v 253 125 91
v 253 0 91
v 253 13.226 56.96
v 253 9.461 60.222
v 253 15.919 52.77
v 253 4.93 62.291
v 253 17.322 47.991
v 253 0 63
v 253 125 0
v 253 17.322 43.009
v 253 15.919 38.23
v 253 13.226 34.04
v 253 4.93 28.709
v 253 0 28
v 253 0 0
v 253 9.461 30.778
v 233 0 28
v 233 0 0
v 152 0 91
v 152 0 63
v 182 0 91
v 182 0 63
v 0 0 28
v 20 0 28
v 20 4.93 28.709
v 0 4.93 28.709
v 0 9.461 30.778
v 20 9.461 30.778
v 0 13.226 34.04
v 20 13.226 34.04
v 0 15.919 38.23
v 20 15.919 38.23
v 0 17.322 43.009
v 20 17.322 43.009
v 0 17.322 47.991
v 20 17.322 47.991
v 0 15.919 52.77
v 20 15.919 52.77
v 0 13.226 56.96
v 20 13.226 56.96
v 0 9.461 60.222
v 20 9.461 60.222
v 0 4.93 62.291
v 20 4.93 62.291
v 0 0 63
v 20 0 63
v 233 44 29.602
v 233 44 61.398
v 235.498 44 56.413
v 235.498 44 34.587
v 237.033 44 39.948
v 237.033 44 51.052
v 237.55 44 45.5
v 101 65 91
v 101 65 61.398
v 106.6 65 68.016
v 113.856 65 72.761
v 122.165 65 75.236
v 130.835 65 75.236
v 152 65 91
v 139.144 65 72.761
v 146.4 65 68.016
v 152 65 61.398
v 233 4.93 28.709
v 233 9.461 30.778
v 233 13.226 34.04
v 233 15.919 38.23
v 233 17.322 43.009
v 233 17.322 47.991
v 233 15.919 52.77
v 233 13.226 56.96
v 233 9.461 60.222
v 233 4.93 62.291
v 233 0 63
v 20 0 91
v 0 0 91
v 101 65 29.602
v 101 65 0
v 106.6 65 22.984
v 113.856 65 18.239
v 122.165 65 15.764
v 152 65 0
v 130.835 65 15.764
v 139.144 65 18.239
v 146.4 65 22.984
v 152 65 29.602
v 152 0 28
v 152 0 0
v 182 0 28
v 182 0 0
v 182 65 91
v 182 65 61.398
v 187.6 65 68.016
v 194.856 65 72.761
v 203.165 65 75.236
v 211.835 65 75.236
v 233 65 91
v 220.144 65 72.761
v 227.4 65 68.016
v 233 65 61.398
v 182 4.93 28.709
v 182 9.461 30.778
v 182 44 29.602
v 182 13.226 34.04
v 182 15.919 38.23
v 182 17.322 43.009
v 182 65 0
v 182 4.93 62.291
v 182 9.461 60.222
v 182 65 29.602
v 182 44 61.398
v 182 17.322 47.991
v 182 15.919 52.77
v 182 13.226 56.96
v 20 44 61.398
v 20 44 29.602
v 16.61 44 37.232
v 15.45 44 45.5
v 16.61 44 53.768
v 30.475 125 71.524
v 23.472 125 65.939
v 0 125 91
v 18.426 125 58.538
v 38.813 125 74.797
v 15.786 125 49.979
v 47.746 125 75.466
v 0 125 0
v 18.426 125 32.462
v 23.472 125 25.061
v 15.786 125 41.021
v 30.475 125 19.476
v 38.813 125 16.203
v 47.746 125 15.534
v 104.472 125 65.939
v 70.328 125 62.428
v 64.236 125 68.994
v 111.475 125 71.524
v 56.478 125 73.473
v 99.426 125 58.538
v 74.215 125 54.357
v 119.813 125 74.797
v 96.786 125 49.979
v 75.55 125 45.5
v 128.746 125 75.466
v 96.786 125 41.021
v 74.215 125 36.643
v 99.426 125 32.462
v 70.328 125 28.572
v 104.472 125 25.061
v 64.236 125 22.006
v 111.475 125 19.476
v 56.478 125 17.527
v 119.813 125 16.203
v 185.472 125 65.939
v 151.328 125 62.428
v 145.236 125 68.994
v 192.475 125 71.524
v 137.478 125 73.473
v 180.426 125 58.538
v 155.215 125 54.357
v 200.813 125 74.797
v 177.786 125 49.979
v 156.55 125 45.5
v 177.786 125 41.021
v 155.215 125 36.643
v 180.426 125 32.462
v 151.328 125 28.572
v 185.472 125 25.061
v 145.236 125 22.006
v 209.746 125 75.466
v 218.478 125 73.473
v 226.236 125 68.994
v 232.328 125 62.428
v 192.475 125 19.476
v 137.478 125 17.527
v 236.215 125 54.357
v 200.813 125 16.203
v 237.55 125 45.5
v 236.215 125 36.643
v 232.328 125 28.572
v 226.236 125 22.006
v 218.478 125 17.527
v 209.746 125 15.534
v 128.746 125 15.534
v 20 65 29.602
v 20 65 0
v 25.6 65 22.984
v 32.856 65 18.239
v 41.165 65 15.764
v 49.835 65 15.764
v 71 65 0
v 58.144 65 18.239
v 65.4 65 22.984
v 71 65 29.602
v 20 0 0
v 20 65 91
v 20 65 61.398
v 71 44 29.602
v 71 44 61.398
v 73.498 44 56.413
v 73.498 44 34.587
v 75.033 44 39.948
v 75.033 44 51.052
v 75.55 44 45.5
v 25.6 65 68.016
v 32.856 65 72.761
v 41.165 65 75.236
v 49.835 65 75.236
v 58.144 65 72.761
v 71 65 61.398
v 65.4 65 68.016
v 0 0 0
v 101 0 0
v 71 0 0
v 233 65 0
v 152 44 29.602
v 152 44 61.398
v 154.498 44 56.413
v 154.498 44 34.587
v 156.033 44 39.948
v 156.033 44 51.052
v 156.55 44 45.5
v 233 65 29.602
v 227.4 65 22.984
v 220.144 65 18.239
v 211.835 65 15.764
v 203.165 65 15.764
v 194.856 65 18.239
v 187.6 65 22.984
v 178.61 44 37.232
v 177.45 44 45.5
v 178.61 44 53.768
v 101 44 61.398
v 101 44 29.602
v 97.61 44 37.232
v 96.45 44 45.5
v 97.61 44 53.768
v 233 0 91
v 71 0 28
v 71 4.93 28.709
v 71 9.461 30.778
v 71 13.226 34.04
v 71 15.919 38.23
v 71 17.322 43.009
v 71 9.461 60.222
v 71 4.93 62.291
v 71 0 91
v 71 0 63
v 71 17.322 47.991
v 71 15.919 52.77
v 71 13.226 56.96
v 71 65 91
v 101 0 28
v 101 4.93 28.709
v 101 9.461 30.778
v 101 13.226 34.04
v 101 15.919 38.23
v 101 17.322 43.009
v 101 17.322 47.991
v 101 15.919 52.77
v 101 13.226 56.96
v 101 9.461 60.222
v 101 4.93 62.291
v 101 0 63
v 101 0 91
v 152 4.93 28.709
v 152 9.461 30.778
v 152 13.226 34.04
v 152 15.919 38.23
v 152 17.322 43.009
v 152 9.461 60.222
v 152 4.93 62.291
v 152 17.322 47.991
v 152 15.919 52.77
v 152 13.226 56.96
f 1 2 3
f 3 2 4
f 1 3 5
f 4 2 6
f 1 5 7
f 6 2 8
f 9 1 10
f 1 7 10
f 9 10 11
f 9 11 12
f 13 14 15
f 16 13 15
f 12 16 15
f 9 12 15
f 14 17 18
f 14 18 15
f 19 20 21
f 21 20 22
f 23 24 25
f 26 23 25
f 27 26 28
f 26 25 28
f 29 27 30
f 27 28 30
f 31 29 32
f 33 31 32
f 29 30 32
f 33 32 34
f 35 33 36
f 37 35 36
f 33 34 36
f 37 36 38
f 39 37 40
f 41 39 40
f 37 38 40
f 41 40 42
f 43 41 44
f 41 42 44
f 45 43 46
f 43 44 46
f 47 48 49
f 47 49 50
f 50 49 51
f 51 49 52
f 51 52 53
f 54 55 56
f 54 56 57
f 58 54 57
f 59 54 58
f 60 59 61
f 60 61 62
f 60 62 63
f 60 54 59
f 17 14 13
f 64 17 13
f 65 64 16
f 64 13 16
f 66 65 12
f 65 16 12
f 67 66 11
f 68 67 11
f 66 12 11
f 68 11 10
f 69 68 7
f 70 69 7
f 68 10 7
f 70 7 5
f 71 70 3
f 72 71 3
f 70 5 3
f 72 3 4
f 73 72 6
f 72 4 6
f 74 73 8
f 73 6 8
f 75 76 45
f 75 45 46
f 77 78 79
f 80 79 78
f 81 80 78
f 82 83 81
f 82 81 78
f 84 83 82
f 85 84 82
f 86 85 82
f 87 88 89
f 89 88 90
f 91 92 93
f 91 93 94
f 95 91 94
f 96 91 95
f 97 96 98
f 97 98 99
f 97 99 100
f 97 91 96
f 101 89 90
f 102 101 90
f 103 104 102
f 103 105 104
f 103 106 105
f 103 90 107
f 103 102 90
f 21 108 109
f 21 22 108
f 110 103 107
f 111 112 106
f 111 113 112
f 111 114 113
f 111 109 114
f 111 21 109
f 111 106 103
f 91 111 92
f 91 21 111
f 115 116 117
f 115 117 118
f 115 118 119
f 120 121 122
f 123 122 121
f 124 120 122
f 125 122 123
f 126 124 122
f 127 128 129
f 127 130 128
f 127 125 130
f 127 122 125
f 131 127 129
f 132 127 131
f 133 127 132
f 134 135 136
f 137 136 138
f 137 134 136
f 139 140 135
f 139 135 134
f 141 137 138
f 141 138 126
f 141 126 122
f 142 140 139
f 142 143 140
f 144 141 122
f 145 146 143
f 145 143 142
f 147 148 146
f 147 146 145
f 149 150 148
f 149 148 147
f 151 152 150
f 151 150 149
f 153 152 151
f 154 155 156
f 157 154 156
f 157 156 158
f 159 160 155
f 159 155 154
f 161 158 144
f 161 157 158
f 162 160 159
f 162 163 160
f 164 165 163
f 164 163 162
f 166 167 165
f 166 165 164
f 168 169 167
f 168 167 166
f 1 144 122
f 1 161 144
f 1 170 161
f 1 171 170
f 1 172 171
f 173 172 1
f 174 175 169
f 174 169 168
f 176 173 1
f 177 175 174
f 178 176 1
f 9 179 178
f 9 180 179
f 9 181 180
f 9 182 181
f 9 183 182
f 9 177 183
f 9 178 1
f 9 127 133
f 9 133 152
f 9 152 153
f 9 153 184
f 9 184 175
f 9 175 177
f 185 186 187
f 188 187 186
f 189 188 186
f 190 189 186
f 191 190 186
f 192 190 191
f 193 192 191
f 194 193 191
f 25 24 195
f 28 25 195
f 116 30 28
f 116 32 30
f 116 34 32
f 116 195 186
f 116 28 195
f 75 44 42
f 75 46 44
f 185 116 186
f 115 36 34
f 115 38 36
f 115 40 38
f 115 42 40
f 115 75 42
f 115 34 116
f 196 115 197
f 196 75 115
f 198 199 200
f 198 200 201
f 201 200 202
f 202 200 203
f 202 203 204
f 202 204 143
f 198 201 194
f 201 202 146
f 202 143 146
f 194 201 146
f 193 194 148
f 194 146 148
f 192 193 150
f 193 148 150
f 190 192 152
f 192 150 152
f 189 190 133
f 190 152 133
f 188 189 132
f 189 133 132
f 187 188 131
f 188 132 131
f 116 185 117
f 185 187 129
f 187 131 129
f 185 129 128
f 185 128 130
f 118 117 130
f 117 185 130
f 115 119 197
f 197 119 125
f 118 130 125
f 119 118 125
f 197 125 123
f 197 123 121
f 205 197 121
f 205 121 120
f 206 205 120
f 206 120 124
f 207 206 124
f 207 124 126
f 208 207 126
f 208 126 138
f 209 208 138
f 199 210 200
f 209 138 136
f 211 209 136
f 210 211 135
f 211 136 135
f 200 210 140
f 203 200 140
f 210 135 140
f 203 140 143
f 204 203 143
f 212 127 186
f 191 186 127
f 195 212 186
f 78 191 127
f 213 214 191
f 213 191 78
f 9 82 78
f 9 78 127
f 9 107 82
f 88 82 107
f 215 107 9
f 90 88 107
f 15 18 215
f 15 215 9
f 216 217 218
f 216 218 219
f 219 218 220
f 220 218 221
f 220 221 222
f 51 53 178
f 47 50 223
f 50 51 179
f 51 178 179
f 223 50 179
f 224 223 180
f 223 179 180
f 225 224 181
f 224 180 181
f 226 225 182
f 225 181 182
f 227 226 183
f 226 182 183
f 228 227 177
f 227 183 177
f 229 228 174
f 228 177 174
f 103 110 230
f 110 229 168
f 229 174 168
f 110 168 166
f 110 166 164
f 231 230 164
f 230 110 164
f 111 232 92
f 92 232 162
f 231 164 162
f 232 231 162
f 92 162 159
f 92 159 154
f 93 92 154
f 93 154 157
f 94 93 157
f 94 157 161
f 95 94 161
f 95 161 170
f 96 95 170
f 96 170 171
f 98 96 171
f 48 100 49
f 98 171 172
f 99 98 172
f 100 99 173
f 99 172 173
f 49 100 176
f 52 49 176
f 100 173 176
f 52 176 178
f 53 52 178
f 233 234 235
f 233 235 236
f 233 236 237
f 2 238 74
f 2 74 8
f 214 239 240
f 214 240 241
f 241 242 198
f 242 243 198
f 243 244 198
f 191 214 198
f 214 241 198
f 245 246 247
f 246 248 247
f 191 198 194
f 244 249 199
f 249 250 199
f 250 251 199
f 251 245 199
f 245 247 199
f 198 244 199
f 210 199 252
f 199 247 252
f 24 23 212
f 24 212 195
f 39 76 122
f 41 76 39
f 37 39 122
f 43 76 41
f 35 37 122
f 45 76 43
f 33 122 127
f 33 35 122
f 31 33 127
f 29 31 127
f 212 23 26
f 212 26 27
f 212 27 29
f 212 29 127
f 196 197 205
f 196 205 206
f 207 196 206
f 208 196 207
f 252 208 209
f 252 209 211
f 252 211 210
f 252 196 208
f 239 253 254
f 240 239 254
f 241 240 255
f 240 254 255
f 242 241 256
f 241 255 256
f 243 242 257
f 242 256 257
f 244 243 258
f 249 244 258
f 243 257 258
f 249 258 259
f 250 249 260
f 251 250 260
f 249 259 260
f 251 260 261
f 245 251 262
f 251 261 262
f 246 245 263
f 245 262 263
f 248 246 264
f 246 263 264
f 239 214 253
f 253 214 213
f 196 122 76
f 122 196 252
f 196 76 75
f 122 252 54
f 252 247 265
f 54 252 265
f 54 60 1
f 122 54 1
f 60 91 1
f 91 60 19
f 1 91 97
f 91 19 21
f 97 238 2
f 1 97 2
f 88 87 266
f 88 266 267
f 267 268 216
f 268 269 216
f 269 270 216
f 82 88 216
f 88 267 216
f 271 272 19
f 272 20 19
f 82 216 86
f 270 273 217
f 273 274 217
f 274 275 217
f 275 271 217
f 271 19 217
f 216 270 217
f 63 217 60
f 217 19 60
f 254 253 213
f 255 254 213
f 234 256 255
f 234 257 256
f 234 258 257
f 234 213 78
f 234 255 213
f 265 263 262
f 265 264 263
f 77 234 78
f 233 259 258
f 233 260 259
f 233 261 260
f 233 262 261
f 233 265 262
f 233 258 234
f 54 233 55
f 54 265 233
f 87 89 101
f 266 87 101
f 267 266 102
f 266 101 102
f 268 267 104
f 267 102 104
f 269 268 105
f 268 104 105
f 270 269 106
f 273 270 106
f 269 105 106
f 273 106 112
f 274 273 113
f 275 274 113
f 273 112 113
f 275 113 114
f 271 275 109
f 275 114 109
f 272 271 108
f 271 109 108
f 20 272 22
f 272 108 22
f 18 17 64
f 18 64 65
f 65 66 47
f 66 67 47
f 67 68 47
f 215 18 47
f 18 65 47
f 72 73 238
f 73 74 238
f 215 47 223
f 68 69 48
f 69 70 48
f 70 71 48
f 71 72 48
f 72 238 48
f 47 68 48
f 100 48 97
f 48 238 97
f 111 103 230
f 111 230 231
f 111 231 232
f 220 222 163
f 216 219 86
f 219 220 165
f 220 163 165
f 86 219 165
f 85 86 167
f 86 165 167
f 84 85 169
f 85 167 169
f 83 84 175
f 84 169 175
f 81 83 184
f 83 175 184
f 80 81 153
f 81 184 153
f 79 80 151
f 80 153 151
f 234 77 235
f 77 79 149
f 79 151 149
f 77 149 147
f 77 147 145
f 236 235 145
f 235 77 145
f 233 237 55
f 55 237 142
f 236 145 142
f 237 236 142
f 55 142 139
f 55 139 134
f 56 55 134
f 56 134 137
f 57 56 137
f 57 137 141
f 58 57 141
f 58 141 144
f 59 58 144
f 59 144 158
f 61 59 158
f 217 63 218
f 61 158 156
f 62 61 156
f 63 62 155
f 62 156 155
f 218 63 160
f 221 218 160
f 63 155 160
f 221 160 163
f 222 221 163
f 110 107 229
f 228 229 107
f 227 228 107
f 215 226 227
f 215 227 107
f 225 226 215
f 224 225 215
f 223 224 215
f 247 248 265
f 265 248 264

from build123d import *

# Parameters (mm, degrees)
SKETCH1_W           = 253
SKETCH1_H           = 91
BOSS_EXTRUDE1_DEPTH = 125
SKETCH2_W           = 51
SKETCH2_H           = 65
CUT_EXTRUDE1_DEPTH  = 92
SKETCH3_R           = 30.05
CUT_EXTRUDE2_DEPTH  = 81
SKETCH4_R           = 17.5
CUT_EXTRUDE3_DEPTH  = 254


with BuildPart() as part:
    # Sketch1 → Boss-Extrude1 (new body)
    with BuildSketch(Plane(origin=(0, 0, 0), x_dir=(1, 0, 0), z_dir=(0, 1, 0))):
        with Locations((126.5, -45.5)):
            Rectangle(SKETCH1_W, SKETCH1_H)
    extrude(amount=BOSS_EXTRUDE1_DEPTH)

    # Sketch2 → Cut-Extrude1 (cut, through all)
    with BuildSketch(Plane.XY.offset(91)):
        with Locations((45.5, 32.5)):
            Rectangle(SKETCH2_W, SKETCH2_H)
        with Locations((126.5, 32.5)):
            Rectangle(SKETCH2_W, SKETCH2_H)
        with Locations((207.5, 32.5)):
            Rectangle(SKETCH2_W, SKETCH2_H)
    extrude(amount=-CUT_EXTRUDE1_DEPTH, mode=Mode.SUBTRACT)

    # Sketch3 → Cut-Extrude2 (cut)
    with BuildSketch(Plane(origin=(0, 125, 0), x_dir=(1, 0, 0), z_dir=(0, 1, 0))):
        with Locations((45.5, -45.5)):
            Circle(SKETCH3_R)
        with Locations((126.5, -45.5)):
            Circle(SKETCH3_R)
        with Locations((207.5, -45.5)):
            Circle(SKETCH3_R)
    extrude(amount=-CUT_EXTRUDE2_DEPTH, mode=Mode.SUBTRACT)

    # Sketch4 → Cut-Extrude3 (cut, through all)
    with BuildSketch(Plane(origin=(253, 0, 0), x_dir=(0, 0, -1), z_dir=(1, 0, 0))):
        with Locations((-45.5, 0)):
            Circle(SKETCH4_R)
    extrude(amount=-CUT_EXTRUDE3_DEPTH, mode=Mode.SUBTRACT)


solid = part.part
